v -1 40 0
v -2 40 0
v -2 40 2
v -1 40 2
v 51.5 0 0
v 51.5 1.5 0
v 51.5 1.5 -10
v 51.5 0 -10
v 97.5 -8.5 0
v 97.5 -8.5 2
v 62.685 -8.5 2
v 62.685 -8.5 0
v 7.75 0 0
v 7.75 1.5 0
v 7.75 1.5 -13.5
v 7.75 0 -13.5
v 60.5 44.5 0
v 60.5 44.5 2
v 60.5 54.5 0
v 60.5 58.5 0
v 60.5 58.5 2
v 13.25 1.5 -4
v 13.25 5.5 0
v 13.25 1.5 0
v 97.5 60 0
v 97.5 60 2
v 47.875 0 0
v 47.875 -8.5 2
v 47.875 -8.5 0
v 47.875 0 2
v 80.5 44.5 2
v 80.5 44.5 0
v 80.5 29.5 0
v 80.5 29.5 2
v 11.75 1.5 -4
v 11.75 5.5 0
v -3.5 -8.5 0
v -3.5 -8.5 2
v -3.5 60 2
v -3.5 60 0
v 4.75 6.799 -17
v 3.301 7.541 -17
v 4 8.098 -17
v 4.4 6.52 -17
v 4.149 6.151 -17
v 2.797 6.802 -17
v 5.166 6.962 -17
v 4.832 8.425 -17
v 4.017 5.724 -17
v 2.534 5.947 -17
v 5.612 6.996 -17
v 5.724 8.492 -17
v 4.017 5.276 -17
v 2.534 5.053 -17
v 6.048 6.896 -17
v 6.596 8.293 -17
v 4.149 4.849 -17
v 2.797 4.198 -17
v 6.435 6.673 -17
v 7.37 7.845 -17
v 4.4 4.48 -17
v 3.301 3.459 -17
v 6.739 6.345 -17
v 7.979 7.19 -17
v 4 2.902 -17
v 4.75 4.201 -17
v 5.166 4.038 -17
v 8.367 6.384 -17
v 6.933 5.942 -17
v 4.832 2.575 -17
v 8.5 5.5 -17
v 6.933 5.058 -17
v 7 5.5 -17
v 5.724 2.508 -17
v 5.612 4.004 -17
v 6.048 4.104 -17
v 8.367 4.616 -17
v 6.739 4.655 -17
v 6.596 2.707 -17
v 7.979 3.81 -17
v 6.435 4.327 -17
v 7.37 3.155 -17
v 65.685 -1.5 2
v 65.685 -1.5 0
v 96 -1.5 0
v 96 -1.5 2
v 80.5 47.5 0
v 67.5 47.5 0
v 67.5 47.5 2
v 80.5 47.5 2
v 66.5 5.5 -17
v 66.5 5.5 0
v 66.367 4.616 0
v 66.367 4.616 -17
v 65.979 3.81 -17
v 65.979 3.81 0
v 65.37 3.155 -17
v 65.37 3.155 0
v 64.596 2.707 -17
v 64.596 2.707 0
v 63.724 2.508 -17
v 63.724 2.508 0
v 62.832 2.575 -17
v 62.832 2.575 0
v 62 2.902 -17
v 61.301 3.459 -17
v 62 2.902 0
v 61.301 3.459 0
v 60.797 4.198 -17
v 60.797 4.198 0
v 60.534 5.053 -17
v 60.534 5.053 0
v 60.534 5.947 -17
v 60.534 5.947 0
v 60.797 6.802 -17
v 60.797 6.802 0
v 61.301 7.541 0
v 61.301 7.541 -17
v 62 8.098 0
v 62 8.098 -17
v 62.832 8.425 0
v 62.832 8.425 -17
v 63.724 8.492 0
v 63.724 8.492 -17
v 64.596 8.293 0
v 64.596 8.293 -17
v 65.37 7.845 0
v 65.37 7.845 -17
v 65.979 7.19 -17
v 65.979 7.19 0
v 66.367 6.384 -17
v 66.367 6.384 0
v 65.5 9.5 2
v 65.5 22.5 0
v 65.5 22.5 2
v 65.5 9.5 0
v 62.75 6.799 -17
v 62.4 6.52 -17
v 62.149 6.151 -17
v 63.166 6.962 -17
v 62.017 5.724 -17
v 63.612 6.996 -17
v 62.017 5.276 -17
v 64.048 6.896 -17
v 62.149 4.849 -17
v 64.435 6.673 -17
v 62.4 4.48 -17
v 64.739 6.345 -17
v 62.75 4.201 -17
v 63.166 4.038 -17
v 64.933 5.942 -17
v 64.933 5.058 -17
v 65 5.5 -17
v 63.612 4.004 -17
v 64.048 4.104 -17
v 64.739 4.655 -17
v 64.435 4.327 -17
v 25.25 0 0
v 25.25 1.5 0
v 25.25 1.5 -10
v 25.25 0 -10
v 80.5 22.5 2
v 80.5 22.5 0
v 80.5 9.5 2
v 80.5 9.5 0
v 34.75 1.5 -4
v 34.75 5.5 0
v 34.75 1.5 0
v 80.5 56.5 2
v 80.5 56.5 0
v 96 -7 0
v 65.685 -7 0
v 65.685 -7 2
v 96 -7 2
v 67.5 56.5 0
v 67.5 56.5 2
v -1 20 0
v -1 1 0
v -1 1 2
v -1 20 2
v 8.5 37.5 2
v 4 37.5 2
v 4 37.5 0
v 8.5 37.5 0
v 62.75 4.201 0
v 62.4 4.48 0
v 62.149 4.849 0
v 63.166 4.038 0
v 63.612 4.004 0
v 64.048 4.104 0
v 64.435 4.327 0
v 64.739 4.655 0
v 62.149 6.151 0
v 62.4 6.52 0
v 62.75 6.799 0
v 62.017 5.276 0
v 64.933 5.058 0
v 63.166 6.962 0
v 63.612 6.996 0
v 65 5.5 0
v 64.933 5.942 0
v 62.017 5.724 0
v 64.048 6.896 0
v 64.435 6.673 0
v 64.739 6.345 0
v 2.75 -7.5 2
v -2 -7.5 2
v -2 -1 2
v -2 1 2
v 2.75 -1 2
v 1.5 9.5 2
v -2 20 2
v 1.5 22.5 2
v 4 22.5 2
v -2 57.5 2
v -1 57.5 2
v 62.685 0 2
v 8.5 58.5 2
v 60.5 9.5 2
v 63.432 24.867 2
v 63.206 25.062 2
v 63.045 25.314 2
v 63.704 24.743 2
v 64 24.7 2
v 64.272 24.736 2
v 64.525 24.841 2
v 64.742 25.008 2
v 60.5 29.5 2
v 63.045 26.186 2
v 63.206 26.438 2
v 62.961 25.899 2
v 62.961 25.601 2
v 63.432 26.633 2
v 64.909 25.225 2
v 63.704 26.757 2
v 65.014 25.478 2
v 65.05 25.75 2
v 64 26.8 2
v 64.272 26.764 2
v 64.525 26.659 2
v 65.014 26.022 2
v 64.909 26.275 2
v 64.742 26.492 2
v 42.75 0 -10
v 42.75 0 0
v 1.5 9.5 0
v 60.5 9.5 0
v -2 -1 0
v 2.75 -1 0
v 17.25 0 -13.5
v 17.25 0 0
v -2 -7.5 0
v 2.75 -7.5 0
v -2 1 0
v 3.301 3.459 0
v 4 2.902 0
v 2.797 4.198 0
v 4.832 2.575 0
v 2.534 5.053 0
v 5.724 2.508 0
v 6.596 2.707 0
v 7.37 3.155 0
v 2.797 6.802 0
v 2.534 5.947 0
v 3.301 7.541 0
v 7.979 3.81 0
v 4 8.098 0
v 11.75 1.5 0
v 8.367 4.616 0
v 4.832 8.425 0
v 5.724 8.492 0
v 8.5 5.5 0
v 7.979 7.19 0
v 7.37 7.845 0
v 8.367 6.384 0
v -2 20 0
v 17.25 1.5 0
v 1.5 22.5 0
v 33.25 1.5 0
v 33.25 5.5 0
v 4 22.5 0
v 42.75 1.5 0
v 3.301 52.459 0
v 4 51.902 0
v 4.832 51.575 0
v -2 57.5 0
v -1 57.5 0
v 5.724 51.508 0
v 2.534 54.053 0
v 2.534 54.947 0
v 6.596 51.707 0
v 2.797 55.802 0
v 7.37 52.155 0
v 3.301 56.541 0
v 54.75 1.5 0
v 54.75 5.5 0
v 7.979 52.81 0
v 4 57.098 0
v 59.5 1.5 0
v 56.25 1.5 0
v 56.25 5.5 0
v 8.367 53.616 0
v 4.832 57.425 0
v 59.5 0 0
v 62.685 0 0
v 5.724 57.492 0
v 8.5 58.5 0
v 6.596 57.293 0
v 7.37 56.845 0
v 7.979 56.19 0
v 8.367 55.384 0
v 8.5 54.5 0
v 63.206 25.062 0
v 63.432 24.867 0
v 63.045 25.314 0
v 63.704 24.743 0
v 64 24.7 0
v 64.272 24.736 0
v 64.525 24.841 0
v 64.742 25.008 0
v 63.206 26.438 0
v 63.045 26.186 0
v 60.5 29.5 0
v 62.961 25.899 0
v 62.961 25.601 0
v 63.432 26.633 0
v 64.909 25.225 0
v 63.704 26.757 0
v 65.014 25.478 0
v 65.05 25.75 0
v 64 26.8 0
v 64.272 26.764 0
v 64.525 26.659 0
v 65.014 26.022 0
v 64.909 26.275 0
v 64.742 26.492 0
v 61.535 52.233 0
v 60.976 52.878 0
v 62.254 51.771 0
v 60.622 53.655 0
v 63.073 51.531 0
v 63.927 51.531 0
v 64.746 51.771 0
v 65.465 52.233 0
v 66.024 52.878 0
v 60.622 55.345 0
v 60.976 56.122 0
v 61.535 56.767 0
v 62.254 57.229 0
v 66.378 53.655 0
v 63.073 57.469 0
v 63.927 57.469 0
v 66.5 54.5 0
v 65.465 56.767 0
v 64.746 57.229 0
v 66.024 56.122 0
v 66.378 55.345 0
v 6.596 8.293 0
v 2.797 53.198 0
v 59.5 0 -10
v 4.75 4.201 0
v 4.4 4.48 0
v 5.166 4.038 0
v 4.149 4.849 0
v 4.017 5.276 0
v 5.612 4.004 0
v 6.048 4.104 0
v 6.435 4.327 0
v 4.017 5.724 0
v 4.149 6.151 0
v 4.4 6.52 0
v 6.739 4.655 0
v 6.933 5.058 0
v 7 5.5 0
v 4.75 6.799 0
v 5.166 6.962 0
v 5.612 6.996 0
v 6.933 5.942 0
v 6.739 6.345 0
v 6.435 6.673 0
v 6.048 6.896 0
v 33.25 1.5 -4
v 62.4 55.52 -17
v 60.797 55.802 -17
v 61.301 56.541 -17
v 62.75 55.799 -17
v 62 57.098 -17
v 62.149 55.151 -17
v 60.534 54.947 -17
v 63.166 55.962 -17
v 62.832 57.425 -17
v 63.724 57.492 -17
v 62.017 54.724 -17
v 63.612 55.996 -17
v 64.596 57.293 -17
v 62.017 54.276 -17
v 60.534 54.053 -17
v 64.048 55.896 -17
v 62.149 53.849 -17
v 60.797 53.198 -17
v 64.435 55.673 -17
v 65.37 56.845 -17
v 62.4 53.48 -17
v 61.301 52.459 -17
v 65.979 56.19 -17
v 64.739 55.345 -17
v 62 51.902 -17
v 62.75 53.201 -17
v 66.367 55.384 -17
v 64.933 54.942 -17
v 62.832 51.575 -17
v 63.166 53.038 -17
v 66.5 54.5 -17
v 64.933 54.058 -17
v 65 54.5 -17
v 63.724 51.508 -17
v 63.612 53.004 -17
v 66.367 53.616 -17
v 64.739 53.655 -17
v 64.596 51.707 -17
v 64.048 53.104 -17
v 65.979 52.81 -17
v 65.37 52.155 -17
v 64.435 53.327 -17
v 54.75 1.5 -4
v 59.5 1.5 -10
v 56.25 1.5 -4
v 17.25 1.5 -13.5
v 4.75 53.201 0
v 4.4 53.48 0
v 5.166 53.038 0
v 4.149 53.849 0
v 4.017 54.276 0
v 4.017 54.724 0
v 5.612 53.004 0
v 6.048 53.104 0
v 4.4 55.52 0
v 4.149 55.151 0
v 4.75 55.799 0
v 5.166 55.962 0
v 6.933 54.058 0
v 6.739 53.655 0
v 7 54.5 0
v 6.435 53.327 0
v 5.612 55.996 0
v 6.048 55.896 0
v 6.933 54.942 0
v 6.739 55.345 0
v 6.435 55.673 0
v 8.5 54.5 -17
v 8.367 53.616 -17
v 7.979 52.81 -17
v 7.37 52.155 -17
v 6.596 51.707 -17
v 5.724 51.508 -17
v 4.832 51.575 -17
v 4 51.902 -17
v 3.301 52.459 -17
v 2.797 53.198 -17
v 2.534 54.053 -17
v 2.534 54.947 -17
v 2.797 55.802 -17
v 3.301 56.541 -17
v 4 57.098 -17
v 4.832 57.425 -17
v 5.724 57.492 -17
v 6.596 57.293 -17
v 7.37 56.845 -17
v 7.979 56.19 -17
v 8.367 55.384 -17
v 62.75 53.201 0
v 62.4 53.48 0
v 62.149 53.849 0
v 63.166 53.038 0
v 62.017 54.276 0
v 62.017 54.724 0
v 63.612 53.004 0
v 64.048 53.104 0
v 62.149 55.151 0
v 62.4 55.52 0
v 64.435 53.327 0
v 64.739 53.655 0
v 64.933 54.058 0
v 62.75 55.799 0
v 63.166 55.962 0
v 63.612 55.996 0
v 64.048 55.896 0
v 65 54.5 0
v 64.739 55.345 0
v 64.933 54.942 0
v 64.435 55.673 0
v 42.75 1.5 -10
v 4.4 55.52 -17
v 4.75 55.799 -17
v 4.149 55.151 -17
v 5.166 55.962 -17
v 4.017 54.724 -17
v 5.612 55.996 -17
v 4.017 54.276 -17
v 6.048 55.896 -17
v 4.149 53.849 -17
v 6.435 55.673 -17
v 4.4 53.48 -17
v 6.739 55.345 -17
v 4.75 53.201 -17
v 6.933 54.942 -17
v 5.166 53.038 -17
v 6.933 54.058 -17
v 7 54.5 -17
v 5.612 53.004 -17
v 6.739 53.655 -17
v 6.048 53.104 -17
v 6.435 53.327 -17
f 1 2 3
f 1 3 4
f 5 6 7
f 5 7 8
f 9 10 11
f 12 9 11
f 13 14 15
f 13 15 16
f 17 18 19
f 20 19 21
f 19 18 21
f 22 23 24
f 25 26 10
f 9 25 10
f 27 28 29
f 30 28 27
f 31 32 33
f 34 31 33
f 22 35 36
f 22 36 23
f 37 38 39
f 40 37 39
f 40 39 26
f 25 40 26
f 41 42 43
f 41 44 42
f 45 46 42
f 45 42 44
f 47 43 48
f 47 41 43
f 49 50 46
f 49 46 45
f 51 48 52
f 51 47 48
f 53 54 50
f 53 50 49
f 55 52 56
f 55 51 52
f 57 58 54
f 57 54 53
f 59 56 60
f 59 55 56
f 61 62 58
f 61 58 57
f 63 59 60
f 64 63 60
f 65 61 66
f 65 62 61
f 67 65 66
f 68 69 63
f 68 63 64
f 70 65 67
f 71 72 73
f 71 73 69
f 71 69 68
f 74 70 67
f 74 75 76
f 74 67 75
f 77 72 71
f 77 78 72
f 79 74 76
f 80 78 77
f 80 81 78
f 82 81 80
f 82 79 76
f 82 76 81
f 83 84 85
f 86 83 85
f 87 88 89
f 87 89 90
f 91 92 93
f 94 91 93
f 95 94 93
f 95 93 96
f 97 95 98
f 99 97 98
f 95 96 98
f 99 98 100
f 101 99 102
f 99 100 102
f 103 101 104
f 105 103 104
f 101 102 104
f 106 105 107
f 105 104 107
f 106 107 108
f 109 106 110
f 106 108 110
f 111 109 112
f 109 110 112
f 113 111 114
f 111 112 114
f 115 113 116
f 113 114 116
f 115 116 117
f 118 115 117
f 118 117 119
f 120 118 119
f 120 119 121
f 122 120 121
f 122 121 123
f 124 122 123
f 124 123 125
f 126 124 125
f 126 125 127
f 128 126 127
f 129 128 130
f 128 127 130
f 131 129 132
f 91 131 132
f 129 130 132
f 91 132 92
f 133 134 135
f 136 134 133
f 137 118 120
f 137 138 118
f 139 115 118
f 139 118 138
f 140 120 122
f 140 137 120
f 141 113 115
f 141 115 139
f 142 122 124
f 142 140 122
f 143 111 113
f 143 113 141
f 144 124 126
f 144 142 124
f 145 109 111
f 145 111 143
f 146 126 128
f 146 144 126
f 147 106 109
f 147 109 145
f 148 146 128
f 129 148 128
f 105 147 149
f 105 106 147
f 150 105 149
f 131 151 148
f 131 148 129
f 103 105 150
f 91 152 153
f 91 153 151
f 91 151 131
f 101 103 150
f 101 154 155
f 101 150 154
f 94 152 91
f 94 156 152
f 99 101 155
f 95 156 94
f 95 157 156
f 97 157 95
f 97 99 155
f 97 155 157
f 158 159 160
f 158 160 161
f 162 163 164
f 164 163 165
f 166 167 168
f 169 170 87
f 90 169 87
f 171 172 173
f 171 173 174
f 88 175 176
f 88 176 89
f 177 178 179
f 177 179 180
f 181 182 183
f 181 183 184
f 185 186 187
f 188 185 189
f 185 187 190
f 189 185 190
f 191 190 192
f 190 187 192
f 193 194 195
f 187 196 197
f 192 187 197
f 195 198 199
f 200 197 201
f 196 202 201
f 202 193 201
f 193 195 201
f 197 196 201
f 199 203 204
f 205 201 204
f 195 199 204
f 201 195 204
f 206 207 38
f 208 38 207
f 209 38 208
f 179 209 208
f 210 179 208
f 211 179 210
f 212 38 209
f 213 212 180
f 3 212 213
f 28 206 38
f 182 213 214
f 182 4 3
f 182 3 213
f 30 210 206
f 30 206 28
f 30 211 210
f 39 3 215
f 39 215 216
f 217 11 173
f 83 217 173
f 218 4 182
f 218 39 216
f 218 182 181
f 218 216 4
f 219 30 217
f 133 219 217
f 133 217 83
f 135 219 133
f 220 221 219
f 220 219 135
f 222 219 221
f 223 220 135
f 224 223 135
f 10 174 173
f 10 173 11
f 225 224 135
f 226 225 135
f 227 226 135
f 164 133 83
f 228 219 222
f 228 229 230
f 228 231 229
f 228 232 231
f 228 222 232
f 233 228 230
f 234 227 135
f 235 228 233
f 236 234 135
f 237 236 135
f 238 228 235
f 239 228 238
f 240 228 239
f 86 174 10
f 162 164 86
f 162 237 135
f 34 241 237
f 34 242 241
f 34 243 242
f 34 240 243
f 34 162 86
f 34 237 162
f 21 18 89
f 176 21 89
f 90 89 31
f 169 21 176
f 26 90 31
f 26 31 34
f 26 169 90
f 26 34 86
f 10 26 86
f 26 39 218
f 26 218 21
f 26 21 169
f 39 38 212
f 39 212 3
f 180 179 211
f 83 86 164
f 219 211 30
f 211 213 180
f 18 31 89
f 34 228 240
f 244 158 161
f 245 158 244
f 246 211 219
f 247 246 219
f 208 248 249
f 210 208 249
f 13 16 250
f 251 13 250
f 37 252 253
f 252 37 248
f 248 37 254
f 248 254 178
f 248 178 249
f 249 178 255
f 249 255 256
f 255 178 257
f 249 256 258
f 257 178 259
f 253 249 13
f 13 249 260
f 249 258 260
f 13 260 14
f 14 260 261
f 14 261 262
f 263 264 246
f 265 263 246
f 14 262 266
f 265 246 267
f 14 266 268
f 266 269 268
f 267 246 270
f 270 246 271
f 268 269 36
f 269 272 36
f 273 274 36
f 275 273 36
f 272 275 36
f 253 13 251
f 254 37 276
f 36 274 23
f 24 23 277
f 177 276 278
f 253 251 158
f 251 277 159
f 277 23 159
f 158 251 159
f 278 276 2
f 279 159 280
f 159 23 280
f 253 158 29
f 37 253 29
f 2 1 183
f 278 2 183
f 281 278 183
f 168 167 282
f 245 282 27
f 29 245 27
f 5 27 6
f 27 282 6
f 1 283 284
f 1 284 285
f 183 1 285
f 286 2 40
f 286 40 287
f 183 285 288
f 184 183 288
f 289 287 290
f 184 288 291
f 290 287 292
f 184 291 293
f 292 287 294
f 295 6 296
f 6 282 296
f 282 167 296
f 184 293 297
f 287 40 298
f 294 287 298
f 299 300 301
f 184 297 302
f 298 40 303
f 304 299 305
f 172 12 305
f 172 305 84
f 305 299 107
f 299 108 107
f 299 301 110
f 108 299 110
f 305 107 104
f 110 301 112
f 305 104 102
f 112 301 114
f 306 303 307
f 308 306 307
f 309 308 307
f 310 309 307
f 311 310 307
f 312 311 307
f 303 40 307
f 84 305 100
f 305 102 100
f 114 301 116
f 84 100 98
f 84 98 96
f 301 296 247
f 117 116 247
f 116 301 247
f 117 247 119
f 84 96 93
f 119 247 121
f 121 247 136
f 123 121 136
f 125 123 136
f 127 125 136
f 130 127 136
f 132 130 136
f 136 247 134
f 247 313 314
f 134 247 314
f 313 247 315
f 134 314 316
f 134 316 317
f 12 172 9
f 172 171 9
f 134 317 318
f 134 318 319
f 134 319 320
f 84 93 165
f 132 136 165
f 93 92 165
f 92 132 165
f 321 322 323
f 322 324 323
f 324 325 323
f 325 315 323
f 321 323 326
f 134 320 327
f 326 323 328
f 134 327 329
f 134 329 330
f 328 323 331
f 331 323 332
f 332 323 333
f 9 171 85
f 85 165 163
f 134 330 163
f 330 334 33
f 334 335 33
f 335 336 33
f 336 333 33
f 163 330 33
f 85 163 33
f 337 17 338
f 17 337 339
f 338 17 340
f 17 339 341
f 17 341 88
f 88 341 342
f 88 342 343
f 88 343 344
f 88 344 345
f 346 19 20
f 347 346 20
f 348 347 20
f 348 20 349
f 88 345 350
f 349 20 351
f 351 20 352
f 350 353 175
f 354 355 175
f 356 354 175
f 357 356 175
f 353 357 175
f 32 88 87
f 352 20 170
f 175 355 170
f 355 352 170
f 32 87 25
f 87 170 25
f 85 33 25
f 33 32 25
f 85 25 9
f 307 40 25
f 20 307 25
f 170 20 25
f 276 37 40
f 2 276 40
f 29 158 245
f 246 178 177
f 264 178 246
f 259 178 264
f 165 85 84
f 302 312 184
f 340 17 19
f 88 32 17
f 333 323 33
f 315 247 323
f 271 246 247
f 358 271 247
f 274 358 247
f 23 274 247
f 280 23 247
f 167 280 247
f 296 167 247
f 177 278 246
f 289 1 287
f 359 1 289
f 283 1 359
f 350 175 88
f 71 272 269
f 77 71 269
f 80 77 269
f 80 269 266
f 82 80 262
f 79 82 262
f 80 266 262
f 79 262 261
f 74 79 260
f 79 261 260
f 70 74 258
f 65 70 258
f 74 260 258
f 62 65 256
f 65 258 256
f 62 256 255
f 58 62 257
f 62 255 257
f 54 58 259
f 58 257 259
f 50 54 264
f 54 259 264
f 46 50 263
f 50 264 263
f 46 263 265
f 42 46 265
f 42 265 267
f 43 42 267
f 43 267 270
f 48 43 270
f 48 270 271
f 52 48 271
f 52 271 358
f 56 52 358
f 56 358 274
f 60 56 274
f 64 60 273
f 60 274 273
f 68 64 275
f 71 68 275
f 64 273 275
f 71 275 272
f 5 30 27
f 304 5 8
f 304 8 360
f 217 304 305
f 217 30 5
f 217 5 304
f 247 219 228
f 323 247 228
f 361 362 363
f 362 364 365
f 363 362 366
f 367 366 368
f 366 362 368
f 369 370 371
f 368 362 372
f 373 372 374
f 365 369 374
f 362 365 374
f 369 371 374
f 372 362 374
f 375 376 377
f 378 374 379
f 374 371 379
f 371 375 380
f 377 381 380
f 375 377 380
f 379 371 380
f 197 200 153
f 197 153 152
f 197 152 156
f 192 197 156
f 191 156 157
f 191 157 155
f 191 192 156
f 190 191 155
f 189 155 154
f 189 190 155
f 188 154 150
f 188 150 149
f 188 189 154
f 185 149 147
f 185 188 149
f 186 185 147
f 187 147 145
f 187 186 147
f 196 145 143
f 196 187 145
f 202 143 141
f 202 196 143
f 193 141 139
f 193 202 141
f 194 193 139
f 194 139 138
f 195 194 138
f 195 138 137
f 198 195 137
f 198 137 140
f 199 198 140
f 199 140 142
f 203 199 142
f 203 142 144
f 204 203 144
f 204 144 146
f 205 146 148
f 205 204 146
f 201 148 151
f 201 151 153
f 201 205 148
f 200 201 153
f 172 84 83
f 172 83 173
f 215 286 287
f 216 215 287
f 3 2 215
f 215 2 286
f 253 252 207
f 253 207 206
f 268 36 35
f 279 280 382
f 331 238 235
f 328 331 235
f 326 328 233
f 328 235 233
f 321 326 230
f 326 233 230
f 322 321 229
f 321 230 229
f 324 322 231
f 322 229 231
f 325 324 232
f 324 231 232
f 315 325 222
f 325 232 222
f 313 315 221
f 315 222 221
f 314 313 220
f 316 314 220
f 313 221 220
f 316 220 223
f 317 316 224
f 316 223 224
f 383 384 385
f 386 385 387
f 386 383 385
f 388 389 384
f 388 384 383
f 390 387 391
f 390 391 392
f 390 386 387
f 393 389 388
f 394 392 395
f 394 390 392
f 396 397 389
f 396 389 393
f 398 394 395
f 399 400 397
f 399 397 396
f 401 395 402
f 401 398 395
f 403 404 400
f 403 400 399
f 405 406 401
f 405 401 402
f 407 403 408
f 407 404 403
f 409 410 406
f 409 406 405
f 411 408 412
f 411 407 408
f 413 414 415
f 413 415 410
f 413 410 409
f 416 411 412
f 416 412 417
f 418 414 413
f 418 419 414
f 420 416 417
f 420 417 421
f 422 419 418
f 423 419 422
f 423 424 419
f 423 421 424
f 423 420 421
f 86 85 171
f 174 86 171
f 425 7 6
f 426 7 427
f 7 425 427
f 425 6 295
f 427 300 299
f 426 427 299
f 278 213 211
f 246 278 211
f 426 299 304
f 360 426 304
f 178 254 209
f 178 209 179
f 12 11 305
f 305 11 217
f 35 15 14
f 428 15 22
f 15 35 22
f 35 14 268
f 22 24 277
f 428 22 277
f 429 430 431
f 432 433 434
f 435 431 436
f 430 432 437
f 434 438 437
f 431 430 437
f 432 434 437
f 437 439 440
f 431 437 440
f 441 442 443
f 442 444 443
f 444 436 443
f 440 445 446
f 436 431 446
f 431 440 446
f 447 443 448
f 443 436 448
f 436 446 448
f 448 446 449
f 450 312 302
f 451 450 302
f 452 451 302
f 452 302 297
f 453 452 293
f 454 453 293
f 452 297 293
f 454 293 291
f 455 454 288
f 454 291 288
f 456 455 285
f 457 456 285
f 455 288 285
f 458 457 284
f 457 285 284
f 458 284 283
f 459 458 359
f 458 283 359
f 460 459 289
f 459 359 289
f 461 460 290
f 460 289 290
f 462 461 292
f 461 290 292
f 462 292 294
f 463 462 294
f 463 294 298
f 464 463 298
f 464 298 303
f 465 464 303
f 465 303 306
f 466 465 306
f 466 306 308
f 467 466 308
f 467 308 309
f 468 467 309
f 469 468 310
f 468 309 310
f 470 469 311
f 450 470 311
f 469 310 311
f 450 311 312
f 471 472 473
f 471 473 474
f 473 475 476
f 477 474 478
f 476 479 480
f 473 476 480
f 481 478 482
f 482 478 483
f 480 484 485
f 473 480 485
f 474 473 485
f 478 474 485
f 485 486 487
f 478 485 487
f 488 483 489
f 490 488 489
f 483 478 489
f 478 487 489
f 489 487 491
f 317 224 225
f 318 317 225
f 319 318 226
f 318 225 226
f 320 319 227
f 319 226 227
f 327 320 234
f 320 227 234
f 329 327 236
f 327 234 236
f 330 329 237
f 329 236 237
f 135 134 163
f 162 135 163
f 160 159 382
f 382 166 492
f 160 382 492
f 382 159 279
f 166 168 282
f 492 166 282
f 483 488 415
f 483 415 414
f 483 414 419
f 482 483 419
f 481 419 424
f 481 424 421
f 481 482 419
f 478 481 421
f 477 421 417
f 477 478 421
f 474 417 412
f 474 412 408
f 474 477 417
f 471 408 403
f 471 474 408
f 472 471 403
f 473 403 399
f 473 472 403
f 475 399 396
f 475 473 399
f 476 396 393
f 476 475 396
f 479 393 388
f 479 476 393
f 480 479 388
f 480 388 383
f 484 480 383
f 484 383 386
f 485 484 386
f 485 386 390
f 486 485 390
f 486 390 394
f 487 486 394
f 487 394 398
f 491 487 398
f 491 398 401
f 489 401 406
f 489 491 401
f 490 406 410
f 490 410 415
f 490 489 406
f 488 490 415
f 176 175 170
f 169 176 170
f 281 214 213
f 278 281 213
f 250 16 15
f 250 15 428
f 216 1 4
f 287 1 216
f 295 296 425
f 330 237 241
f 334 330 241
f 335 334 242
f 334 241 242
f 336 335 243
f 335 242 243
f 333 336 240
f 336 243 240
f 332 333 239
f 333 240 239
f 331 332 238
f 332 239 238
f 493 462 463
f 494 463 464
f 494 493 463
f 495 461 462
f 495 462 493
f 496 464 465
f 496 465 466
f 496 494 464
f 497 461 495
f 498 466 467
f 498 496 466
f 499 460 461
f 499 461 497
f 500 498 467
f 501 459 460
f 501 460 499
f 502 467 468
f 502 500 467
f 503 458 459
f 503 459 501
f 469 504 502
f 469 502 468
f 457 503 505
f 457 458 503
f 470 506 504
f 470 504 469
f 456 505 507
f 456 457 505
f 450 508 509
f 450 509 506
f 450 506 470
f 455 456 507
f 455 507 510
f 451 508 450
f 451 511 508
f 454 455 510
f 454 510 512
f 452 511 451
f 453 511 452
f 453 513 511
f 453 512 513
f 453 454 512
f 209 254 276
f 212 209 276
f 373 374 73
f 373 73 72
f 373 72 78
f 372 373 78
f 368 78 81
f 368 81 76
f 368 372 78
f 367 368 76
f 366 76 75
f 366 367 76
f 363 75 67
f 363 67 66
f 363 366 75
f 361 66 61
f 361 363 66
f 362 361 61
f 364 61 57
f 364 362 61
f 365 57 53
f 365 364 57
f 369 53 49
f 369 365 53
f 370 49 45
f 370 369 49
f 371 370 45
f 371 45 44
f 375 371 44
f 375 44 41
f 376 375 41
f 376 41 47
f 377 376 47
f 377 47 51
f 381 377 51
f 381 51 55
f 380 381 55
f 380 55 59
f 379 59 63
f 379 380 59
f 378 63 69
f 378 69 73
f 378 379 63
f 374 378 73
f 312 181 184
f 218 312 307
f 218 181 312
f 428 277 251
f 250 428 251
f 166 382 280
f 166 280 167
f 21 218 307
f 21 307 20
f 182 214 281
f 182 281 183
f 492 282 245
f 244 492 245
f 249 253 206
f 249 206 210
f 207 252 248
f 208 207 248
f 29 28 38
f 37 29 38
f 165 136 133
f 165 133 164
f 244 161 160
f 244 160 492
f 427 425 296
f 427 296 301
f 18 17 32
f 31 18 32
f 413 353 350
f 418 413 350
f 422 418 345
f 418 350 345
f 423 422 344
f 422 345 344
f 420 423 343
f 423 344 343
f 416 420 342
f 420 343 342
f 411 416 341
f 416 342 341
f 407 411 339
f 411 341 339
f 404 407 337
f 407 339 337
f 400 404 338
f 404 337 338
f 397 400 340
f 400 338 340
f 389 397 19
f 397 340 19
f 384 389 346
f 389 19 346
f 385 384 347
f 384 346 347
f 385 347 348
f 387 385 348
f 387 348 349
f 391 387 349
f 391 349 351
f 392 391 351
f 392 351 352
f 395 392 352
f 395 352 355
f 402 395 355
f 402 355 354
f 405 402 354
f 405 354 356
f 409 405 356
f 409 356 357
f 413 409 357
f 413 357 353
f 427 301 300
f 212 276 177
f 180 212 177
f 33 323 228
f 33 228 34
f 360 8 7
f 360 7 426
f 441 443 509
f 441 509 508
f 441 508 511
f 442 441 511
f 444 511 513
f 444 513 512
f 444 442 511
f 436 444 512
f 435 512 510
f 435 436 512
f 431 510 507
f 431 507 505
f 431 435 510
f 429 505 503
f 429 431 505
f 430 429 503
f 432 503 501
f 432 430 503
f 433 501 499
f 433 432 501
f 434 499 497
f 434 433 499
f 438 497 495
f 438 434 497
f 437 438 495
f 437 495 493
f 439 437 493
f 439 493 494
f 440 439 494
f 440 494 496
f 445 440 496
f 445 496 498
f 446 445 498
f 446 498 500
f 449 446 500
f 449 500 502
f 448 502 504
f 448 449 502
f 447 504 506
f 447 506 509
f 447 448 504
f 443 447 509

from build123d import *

# Parameters (mm, degrees)
F0_W      = 89
F0_H      = 60
F1_DEPTH  = 2
F2_R      = 3
F2_R_2    = 1.5
F3_DEPTH  = 17
F4_W      = 52
F4_H      = 49
F5_DEPTH  = 2
F6_W      = 4.5
F6_H      = 15
F7_DEPTH  = 2
F8_W      = 14.81
F8_H      = 10
F9_DEPTH  = 2
F11_W     = 17.5
F11_H     = 1.5
F11_W_2   = 8
F12_DEPTH = 10
F11_W_3   = 9.5
F13_DEPTH = 13.5
F14_W     = 1.5
F14_H     = 4
F15_DEPTH = 4
F16_SIZE  = 3.99999
F17_W     = 20
F17_H     = 15
F18_DEPTH = 2
F19_W     = 15
F19_H     = 13
F19_W_2   = 30.315
F19_H_2   = 5.5
F19_W_3   = 13
F19_H_3   = 9
F20_DEPTH = 2
F22_W     = 4.75
F22_H     = 6.5
F22_W_2   = 1
F22_H_2   = 19
F22_H_3   = 17.5
F23_DEPTH = 2
F25_DEPTH = 2
F21_R     = 1.05
F26_DEPTH = 2


# Not quite as in the source:
# - a fillet or chamfer is up to 0.001 mm smaller than in the source, because OpenCascade refuses the exact size
# - a feature of the source that left no trace in its solid (it failed there, or was rolled back) is left out


with BuildPart() as f1:
    # F0 (on Top) → F1 (new body)
    with BuildSketch(Plane.XY):
        Polygon((89, 0), (0, 0), (0, 60), (-5, 60), (-5, 0), (-5, -10), (89, -10), (99, -10), (99, 60), (89, 60), align=None)
        Polygon((-5, 60), (0, 60), (89, 60), (99, 60), (99, 61.5), (-5, 61.5), align=None)
        with Locations((44.5, 30)):
            Rectangle(F0_W, F0_H)
    extrude(amount=F1_DEPTH)

    # F2 (on face) → F3 (join)
    with BuildSketch(Plane(origin=(0, 0, 0), x_dir=(1, 0, 0), z_dir=(0, 0, -1))):
        with Locations((5.5, -5.5)):
            Circle(F2_R)
        with Locations((5.5, -5.5)):
            Circle(F2_R_2, mode=Mode.SUBTRACT)
        with Locations((63.5, -5.5)):
            Circle(F2_R)
        with Locations((63.5, -5.5)):
            Circle(F2_R_2, mode=Mode.SUBTRACT)
        with Locations((5.5, -54.5)):
            Circle(F2_R)
        with Locations((5.5, -54.5)):
            Circle(F2_R_2, mode=Mode.SUBTRACT)
        with Locations((63.5, -54.5)):
            Circle(F2_R)
        with Locations((63.5, -54.5)):
            Circle(F2_R_2, mode=Mode.SUBTRACT)
    extrude(amount=F3_DEPTH)

    # F4 (on face) → F5 (cut, through all)
    with BuildSketch(Plane.XY.offset(2)):
        with Locations((34.5, 34)):
            Rectangle(F4_W, F4_H)
    extrude(amount=-F5_DEPTH, mode=Mode.SUBTRACT)

    # F6 (on face) → F7 (cut, through all)
    with BuildSketch(Plane.XY.offset(2)):
        with Locations((6.25, 30)):
            Rectangle(F6_W, F6_H)
        Polygon((8.5, 9.5), (8.5, 22.5), (4, 22.5), (1.5, 22.5), (1.5, 9.5), align=None)
    extrude(amount=-F7_DEPTH, mode=Mode.SUBTRACT)

    # F8 (on face) → F9 (cut, through all)
    with BuildSketch(Plane.XY.offset(2)):
        with Locations((55.28, -5)):
            Rectangle(F8_W, F8_H)
    extrude(amount=-F9_DEPTH, mode=Mode.SUBTRACT)

    # F11 (on face) → F12 (join)
    with BuildSketch(Plane(origin=(0, 0, 0), x_dir=(1, 0, 0), z_dir=(0, 0, -1))):
        with Locations((34, -0.75)):
            Rectangle(F11_W, F11_H)
        with Locations((55.5, -0.75)):
            Rectangle(F11_W_2, F11_H)
    extrude(amount=F12_DEPTH)

    # F11 (on face) → F13 (join)
    with BuildSketch(Plane(origin=(0, 0, 0), x_dir=(1, 0, 0), z_dir=(0, 0, -1))):
        with Locations((12.5, -0.75)):
            Rectangle(F11_W_3, F11_H)
    extrude(amount=F13_DEPTH)

    # F14 (on face) → F15 (join)
    with BuildSketch(Plane(origin=(0, 0, 0), x_dir=(1, 0, 0), z_dir=(0, 0, -1))):
        with Locations((34, -3.5)):
            Rectangle(F14_W, F14_H)
        with Locations((55.5, -3.5)):
            Rectangle(F14_W, F14_H)
        with Locations((12.5, -3.5)):
            Rectangle(F14_W, F14_H)
    extrude(amount=F15_DEPTH)

    # F16 (size 4 in the source; OpenCascade refuses exactly that, so slightly less here)
    f16_edges = [f1.edges().sort_by_distance(p)[0] for p in [
        (12.5, 5.5, -4),
        (34, 5.5, -4),
        (55.5, 5.5, -4),
    ]]
    chamfer(f16_edges, length=F16_SIZE)

    # F17 (on face) → F18 (cut, through all)
    with BuildSketch(Plane(origin=(0, 0, 0), x_dir=(1, 0, 0), z_dir=(0, 0, -1))):
        with Locations((70.5, -37)):
            Rectangle(F17_W, F17_H)
    extrude(amount=-F18_DEPTH, mode=Mode.SUBTRACT)

    # F19 (on face) → F20 (cut, through all)
    with BuildSketch(Plane(origin=(0, 0, 0), x_dir=(1, 0, 0), z_dir=(0, 0, -1))):
        with Locations((73, -16)):
            Rectangle(F19_W, F19_H)
        with Locations((80.8425, 4.25)):
            Rectangle(F19_W_2, F19_H_2)
        with Locations((74, -52)):
            Rectangle(F19_W_3, F19_H_3)
    extrude(amount=-F20_DEPTH, mode=Mode.SUBTRACT)

    # F22 (on face) → F23 (cut, through all)
    with BuildSketch(Plane.XY):
        with Locations((0.375, -4.25)):
            Rectangle(F22_W, F22_H)
        with Locations((-1.5, 10.5)):
            Rectangle(F22_W_2, F22_H_2)
        with Locations((-1.5, 48.75)):
            Rectangle(F22_W_2, F22_H_3)
    extrude(amount=F23_DEPTH, mode=Mode.SUBTRACT)

    # F24 (on face) → F25 (cut, through all)
    with BuildSketch(Plane.XY.offset(2)):
        Polygon((-3.5, -8.5), (-3.5, 60), (97.5, 60), (97.5, -8.5), (62.685, -8.5), (62.685, -10), (99, -10), (99, 61.5), (-5, 61.5), (-5, -10), (47.875, -10), (47.875, -8.5), align=None)
    extrude(amount=-F25_DEPTH, mode=Mode.SUBTRACT)

    # F21 (on face) → F26 (cut, through all)
    with BuildSketch(Plane.XY.offset(2)):
        with BuildLine():
            ThreePointArc((64, 24.7), (64.7424621202, 25.0075378798), (65.05, 25.75))
            ThreePointArc((65.05, 25.75), (64.7424621202, 26.4924621202), (64, 26.8))
            Line((64, 26.8), (64, 25.75))
            Line((64, 25.75), (64, 24.7))
        make_face()
        with BuildLine():
            Line((64, 25.75), (64, 26.8))
            ThreePointArc((64, 26.8), (62.95, 25.75), (64, 24.7))
            Line((64, 24.7), (64, 25.75))
        make_face()
        with Locations((44, 14.5)):
            Circle(F21_R)
    extrude(amount=-F26_DEPTH, mode=Mode.SUBTRACT)


solid = f1.part
